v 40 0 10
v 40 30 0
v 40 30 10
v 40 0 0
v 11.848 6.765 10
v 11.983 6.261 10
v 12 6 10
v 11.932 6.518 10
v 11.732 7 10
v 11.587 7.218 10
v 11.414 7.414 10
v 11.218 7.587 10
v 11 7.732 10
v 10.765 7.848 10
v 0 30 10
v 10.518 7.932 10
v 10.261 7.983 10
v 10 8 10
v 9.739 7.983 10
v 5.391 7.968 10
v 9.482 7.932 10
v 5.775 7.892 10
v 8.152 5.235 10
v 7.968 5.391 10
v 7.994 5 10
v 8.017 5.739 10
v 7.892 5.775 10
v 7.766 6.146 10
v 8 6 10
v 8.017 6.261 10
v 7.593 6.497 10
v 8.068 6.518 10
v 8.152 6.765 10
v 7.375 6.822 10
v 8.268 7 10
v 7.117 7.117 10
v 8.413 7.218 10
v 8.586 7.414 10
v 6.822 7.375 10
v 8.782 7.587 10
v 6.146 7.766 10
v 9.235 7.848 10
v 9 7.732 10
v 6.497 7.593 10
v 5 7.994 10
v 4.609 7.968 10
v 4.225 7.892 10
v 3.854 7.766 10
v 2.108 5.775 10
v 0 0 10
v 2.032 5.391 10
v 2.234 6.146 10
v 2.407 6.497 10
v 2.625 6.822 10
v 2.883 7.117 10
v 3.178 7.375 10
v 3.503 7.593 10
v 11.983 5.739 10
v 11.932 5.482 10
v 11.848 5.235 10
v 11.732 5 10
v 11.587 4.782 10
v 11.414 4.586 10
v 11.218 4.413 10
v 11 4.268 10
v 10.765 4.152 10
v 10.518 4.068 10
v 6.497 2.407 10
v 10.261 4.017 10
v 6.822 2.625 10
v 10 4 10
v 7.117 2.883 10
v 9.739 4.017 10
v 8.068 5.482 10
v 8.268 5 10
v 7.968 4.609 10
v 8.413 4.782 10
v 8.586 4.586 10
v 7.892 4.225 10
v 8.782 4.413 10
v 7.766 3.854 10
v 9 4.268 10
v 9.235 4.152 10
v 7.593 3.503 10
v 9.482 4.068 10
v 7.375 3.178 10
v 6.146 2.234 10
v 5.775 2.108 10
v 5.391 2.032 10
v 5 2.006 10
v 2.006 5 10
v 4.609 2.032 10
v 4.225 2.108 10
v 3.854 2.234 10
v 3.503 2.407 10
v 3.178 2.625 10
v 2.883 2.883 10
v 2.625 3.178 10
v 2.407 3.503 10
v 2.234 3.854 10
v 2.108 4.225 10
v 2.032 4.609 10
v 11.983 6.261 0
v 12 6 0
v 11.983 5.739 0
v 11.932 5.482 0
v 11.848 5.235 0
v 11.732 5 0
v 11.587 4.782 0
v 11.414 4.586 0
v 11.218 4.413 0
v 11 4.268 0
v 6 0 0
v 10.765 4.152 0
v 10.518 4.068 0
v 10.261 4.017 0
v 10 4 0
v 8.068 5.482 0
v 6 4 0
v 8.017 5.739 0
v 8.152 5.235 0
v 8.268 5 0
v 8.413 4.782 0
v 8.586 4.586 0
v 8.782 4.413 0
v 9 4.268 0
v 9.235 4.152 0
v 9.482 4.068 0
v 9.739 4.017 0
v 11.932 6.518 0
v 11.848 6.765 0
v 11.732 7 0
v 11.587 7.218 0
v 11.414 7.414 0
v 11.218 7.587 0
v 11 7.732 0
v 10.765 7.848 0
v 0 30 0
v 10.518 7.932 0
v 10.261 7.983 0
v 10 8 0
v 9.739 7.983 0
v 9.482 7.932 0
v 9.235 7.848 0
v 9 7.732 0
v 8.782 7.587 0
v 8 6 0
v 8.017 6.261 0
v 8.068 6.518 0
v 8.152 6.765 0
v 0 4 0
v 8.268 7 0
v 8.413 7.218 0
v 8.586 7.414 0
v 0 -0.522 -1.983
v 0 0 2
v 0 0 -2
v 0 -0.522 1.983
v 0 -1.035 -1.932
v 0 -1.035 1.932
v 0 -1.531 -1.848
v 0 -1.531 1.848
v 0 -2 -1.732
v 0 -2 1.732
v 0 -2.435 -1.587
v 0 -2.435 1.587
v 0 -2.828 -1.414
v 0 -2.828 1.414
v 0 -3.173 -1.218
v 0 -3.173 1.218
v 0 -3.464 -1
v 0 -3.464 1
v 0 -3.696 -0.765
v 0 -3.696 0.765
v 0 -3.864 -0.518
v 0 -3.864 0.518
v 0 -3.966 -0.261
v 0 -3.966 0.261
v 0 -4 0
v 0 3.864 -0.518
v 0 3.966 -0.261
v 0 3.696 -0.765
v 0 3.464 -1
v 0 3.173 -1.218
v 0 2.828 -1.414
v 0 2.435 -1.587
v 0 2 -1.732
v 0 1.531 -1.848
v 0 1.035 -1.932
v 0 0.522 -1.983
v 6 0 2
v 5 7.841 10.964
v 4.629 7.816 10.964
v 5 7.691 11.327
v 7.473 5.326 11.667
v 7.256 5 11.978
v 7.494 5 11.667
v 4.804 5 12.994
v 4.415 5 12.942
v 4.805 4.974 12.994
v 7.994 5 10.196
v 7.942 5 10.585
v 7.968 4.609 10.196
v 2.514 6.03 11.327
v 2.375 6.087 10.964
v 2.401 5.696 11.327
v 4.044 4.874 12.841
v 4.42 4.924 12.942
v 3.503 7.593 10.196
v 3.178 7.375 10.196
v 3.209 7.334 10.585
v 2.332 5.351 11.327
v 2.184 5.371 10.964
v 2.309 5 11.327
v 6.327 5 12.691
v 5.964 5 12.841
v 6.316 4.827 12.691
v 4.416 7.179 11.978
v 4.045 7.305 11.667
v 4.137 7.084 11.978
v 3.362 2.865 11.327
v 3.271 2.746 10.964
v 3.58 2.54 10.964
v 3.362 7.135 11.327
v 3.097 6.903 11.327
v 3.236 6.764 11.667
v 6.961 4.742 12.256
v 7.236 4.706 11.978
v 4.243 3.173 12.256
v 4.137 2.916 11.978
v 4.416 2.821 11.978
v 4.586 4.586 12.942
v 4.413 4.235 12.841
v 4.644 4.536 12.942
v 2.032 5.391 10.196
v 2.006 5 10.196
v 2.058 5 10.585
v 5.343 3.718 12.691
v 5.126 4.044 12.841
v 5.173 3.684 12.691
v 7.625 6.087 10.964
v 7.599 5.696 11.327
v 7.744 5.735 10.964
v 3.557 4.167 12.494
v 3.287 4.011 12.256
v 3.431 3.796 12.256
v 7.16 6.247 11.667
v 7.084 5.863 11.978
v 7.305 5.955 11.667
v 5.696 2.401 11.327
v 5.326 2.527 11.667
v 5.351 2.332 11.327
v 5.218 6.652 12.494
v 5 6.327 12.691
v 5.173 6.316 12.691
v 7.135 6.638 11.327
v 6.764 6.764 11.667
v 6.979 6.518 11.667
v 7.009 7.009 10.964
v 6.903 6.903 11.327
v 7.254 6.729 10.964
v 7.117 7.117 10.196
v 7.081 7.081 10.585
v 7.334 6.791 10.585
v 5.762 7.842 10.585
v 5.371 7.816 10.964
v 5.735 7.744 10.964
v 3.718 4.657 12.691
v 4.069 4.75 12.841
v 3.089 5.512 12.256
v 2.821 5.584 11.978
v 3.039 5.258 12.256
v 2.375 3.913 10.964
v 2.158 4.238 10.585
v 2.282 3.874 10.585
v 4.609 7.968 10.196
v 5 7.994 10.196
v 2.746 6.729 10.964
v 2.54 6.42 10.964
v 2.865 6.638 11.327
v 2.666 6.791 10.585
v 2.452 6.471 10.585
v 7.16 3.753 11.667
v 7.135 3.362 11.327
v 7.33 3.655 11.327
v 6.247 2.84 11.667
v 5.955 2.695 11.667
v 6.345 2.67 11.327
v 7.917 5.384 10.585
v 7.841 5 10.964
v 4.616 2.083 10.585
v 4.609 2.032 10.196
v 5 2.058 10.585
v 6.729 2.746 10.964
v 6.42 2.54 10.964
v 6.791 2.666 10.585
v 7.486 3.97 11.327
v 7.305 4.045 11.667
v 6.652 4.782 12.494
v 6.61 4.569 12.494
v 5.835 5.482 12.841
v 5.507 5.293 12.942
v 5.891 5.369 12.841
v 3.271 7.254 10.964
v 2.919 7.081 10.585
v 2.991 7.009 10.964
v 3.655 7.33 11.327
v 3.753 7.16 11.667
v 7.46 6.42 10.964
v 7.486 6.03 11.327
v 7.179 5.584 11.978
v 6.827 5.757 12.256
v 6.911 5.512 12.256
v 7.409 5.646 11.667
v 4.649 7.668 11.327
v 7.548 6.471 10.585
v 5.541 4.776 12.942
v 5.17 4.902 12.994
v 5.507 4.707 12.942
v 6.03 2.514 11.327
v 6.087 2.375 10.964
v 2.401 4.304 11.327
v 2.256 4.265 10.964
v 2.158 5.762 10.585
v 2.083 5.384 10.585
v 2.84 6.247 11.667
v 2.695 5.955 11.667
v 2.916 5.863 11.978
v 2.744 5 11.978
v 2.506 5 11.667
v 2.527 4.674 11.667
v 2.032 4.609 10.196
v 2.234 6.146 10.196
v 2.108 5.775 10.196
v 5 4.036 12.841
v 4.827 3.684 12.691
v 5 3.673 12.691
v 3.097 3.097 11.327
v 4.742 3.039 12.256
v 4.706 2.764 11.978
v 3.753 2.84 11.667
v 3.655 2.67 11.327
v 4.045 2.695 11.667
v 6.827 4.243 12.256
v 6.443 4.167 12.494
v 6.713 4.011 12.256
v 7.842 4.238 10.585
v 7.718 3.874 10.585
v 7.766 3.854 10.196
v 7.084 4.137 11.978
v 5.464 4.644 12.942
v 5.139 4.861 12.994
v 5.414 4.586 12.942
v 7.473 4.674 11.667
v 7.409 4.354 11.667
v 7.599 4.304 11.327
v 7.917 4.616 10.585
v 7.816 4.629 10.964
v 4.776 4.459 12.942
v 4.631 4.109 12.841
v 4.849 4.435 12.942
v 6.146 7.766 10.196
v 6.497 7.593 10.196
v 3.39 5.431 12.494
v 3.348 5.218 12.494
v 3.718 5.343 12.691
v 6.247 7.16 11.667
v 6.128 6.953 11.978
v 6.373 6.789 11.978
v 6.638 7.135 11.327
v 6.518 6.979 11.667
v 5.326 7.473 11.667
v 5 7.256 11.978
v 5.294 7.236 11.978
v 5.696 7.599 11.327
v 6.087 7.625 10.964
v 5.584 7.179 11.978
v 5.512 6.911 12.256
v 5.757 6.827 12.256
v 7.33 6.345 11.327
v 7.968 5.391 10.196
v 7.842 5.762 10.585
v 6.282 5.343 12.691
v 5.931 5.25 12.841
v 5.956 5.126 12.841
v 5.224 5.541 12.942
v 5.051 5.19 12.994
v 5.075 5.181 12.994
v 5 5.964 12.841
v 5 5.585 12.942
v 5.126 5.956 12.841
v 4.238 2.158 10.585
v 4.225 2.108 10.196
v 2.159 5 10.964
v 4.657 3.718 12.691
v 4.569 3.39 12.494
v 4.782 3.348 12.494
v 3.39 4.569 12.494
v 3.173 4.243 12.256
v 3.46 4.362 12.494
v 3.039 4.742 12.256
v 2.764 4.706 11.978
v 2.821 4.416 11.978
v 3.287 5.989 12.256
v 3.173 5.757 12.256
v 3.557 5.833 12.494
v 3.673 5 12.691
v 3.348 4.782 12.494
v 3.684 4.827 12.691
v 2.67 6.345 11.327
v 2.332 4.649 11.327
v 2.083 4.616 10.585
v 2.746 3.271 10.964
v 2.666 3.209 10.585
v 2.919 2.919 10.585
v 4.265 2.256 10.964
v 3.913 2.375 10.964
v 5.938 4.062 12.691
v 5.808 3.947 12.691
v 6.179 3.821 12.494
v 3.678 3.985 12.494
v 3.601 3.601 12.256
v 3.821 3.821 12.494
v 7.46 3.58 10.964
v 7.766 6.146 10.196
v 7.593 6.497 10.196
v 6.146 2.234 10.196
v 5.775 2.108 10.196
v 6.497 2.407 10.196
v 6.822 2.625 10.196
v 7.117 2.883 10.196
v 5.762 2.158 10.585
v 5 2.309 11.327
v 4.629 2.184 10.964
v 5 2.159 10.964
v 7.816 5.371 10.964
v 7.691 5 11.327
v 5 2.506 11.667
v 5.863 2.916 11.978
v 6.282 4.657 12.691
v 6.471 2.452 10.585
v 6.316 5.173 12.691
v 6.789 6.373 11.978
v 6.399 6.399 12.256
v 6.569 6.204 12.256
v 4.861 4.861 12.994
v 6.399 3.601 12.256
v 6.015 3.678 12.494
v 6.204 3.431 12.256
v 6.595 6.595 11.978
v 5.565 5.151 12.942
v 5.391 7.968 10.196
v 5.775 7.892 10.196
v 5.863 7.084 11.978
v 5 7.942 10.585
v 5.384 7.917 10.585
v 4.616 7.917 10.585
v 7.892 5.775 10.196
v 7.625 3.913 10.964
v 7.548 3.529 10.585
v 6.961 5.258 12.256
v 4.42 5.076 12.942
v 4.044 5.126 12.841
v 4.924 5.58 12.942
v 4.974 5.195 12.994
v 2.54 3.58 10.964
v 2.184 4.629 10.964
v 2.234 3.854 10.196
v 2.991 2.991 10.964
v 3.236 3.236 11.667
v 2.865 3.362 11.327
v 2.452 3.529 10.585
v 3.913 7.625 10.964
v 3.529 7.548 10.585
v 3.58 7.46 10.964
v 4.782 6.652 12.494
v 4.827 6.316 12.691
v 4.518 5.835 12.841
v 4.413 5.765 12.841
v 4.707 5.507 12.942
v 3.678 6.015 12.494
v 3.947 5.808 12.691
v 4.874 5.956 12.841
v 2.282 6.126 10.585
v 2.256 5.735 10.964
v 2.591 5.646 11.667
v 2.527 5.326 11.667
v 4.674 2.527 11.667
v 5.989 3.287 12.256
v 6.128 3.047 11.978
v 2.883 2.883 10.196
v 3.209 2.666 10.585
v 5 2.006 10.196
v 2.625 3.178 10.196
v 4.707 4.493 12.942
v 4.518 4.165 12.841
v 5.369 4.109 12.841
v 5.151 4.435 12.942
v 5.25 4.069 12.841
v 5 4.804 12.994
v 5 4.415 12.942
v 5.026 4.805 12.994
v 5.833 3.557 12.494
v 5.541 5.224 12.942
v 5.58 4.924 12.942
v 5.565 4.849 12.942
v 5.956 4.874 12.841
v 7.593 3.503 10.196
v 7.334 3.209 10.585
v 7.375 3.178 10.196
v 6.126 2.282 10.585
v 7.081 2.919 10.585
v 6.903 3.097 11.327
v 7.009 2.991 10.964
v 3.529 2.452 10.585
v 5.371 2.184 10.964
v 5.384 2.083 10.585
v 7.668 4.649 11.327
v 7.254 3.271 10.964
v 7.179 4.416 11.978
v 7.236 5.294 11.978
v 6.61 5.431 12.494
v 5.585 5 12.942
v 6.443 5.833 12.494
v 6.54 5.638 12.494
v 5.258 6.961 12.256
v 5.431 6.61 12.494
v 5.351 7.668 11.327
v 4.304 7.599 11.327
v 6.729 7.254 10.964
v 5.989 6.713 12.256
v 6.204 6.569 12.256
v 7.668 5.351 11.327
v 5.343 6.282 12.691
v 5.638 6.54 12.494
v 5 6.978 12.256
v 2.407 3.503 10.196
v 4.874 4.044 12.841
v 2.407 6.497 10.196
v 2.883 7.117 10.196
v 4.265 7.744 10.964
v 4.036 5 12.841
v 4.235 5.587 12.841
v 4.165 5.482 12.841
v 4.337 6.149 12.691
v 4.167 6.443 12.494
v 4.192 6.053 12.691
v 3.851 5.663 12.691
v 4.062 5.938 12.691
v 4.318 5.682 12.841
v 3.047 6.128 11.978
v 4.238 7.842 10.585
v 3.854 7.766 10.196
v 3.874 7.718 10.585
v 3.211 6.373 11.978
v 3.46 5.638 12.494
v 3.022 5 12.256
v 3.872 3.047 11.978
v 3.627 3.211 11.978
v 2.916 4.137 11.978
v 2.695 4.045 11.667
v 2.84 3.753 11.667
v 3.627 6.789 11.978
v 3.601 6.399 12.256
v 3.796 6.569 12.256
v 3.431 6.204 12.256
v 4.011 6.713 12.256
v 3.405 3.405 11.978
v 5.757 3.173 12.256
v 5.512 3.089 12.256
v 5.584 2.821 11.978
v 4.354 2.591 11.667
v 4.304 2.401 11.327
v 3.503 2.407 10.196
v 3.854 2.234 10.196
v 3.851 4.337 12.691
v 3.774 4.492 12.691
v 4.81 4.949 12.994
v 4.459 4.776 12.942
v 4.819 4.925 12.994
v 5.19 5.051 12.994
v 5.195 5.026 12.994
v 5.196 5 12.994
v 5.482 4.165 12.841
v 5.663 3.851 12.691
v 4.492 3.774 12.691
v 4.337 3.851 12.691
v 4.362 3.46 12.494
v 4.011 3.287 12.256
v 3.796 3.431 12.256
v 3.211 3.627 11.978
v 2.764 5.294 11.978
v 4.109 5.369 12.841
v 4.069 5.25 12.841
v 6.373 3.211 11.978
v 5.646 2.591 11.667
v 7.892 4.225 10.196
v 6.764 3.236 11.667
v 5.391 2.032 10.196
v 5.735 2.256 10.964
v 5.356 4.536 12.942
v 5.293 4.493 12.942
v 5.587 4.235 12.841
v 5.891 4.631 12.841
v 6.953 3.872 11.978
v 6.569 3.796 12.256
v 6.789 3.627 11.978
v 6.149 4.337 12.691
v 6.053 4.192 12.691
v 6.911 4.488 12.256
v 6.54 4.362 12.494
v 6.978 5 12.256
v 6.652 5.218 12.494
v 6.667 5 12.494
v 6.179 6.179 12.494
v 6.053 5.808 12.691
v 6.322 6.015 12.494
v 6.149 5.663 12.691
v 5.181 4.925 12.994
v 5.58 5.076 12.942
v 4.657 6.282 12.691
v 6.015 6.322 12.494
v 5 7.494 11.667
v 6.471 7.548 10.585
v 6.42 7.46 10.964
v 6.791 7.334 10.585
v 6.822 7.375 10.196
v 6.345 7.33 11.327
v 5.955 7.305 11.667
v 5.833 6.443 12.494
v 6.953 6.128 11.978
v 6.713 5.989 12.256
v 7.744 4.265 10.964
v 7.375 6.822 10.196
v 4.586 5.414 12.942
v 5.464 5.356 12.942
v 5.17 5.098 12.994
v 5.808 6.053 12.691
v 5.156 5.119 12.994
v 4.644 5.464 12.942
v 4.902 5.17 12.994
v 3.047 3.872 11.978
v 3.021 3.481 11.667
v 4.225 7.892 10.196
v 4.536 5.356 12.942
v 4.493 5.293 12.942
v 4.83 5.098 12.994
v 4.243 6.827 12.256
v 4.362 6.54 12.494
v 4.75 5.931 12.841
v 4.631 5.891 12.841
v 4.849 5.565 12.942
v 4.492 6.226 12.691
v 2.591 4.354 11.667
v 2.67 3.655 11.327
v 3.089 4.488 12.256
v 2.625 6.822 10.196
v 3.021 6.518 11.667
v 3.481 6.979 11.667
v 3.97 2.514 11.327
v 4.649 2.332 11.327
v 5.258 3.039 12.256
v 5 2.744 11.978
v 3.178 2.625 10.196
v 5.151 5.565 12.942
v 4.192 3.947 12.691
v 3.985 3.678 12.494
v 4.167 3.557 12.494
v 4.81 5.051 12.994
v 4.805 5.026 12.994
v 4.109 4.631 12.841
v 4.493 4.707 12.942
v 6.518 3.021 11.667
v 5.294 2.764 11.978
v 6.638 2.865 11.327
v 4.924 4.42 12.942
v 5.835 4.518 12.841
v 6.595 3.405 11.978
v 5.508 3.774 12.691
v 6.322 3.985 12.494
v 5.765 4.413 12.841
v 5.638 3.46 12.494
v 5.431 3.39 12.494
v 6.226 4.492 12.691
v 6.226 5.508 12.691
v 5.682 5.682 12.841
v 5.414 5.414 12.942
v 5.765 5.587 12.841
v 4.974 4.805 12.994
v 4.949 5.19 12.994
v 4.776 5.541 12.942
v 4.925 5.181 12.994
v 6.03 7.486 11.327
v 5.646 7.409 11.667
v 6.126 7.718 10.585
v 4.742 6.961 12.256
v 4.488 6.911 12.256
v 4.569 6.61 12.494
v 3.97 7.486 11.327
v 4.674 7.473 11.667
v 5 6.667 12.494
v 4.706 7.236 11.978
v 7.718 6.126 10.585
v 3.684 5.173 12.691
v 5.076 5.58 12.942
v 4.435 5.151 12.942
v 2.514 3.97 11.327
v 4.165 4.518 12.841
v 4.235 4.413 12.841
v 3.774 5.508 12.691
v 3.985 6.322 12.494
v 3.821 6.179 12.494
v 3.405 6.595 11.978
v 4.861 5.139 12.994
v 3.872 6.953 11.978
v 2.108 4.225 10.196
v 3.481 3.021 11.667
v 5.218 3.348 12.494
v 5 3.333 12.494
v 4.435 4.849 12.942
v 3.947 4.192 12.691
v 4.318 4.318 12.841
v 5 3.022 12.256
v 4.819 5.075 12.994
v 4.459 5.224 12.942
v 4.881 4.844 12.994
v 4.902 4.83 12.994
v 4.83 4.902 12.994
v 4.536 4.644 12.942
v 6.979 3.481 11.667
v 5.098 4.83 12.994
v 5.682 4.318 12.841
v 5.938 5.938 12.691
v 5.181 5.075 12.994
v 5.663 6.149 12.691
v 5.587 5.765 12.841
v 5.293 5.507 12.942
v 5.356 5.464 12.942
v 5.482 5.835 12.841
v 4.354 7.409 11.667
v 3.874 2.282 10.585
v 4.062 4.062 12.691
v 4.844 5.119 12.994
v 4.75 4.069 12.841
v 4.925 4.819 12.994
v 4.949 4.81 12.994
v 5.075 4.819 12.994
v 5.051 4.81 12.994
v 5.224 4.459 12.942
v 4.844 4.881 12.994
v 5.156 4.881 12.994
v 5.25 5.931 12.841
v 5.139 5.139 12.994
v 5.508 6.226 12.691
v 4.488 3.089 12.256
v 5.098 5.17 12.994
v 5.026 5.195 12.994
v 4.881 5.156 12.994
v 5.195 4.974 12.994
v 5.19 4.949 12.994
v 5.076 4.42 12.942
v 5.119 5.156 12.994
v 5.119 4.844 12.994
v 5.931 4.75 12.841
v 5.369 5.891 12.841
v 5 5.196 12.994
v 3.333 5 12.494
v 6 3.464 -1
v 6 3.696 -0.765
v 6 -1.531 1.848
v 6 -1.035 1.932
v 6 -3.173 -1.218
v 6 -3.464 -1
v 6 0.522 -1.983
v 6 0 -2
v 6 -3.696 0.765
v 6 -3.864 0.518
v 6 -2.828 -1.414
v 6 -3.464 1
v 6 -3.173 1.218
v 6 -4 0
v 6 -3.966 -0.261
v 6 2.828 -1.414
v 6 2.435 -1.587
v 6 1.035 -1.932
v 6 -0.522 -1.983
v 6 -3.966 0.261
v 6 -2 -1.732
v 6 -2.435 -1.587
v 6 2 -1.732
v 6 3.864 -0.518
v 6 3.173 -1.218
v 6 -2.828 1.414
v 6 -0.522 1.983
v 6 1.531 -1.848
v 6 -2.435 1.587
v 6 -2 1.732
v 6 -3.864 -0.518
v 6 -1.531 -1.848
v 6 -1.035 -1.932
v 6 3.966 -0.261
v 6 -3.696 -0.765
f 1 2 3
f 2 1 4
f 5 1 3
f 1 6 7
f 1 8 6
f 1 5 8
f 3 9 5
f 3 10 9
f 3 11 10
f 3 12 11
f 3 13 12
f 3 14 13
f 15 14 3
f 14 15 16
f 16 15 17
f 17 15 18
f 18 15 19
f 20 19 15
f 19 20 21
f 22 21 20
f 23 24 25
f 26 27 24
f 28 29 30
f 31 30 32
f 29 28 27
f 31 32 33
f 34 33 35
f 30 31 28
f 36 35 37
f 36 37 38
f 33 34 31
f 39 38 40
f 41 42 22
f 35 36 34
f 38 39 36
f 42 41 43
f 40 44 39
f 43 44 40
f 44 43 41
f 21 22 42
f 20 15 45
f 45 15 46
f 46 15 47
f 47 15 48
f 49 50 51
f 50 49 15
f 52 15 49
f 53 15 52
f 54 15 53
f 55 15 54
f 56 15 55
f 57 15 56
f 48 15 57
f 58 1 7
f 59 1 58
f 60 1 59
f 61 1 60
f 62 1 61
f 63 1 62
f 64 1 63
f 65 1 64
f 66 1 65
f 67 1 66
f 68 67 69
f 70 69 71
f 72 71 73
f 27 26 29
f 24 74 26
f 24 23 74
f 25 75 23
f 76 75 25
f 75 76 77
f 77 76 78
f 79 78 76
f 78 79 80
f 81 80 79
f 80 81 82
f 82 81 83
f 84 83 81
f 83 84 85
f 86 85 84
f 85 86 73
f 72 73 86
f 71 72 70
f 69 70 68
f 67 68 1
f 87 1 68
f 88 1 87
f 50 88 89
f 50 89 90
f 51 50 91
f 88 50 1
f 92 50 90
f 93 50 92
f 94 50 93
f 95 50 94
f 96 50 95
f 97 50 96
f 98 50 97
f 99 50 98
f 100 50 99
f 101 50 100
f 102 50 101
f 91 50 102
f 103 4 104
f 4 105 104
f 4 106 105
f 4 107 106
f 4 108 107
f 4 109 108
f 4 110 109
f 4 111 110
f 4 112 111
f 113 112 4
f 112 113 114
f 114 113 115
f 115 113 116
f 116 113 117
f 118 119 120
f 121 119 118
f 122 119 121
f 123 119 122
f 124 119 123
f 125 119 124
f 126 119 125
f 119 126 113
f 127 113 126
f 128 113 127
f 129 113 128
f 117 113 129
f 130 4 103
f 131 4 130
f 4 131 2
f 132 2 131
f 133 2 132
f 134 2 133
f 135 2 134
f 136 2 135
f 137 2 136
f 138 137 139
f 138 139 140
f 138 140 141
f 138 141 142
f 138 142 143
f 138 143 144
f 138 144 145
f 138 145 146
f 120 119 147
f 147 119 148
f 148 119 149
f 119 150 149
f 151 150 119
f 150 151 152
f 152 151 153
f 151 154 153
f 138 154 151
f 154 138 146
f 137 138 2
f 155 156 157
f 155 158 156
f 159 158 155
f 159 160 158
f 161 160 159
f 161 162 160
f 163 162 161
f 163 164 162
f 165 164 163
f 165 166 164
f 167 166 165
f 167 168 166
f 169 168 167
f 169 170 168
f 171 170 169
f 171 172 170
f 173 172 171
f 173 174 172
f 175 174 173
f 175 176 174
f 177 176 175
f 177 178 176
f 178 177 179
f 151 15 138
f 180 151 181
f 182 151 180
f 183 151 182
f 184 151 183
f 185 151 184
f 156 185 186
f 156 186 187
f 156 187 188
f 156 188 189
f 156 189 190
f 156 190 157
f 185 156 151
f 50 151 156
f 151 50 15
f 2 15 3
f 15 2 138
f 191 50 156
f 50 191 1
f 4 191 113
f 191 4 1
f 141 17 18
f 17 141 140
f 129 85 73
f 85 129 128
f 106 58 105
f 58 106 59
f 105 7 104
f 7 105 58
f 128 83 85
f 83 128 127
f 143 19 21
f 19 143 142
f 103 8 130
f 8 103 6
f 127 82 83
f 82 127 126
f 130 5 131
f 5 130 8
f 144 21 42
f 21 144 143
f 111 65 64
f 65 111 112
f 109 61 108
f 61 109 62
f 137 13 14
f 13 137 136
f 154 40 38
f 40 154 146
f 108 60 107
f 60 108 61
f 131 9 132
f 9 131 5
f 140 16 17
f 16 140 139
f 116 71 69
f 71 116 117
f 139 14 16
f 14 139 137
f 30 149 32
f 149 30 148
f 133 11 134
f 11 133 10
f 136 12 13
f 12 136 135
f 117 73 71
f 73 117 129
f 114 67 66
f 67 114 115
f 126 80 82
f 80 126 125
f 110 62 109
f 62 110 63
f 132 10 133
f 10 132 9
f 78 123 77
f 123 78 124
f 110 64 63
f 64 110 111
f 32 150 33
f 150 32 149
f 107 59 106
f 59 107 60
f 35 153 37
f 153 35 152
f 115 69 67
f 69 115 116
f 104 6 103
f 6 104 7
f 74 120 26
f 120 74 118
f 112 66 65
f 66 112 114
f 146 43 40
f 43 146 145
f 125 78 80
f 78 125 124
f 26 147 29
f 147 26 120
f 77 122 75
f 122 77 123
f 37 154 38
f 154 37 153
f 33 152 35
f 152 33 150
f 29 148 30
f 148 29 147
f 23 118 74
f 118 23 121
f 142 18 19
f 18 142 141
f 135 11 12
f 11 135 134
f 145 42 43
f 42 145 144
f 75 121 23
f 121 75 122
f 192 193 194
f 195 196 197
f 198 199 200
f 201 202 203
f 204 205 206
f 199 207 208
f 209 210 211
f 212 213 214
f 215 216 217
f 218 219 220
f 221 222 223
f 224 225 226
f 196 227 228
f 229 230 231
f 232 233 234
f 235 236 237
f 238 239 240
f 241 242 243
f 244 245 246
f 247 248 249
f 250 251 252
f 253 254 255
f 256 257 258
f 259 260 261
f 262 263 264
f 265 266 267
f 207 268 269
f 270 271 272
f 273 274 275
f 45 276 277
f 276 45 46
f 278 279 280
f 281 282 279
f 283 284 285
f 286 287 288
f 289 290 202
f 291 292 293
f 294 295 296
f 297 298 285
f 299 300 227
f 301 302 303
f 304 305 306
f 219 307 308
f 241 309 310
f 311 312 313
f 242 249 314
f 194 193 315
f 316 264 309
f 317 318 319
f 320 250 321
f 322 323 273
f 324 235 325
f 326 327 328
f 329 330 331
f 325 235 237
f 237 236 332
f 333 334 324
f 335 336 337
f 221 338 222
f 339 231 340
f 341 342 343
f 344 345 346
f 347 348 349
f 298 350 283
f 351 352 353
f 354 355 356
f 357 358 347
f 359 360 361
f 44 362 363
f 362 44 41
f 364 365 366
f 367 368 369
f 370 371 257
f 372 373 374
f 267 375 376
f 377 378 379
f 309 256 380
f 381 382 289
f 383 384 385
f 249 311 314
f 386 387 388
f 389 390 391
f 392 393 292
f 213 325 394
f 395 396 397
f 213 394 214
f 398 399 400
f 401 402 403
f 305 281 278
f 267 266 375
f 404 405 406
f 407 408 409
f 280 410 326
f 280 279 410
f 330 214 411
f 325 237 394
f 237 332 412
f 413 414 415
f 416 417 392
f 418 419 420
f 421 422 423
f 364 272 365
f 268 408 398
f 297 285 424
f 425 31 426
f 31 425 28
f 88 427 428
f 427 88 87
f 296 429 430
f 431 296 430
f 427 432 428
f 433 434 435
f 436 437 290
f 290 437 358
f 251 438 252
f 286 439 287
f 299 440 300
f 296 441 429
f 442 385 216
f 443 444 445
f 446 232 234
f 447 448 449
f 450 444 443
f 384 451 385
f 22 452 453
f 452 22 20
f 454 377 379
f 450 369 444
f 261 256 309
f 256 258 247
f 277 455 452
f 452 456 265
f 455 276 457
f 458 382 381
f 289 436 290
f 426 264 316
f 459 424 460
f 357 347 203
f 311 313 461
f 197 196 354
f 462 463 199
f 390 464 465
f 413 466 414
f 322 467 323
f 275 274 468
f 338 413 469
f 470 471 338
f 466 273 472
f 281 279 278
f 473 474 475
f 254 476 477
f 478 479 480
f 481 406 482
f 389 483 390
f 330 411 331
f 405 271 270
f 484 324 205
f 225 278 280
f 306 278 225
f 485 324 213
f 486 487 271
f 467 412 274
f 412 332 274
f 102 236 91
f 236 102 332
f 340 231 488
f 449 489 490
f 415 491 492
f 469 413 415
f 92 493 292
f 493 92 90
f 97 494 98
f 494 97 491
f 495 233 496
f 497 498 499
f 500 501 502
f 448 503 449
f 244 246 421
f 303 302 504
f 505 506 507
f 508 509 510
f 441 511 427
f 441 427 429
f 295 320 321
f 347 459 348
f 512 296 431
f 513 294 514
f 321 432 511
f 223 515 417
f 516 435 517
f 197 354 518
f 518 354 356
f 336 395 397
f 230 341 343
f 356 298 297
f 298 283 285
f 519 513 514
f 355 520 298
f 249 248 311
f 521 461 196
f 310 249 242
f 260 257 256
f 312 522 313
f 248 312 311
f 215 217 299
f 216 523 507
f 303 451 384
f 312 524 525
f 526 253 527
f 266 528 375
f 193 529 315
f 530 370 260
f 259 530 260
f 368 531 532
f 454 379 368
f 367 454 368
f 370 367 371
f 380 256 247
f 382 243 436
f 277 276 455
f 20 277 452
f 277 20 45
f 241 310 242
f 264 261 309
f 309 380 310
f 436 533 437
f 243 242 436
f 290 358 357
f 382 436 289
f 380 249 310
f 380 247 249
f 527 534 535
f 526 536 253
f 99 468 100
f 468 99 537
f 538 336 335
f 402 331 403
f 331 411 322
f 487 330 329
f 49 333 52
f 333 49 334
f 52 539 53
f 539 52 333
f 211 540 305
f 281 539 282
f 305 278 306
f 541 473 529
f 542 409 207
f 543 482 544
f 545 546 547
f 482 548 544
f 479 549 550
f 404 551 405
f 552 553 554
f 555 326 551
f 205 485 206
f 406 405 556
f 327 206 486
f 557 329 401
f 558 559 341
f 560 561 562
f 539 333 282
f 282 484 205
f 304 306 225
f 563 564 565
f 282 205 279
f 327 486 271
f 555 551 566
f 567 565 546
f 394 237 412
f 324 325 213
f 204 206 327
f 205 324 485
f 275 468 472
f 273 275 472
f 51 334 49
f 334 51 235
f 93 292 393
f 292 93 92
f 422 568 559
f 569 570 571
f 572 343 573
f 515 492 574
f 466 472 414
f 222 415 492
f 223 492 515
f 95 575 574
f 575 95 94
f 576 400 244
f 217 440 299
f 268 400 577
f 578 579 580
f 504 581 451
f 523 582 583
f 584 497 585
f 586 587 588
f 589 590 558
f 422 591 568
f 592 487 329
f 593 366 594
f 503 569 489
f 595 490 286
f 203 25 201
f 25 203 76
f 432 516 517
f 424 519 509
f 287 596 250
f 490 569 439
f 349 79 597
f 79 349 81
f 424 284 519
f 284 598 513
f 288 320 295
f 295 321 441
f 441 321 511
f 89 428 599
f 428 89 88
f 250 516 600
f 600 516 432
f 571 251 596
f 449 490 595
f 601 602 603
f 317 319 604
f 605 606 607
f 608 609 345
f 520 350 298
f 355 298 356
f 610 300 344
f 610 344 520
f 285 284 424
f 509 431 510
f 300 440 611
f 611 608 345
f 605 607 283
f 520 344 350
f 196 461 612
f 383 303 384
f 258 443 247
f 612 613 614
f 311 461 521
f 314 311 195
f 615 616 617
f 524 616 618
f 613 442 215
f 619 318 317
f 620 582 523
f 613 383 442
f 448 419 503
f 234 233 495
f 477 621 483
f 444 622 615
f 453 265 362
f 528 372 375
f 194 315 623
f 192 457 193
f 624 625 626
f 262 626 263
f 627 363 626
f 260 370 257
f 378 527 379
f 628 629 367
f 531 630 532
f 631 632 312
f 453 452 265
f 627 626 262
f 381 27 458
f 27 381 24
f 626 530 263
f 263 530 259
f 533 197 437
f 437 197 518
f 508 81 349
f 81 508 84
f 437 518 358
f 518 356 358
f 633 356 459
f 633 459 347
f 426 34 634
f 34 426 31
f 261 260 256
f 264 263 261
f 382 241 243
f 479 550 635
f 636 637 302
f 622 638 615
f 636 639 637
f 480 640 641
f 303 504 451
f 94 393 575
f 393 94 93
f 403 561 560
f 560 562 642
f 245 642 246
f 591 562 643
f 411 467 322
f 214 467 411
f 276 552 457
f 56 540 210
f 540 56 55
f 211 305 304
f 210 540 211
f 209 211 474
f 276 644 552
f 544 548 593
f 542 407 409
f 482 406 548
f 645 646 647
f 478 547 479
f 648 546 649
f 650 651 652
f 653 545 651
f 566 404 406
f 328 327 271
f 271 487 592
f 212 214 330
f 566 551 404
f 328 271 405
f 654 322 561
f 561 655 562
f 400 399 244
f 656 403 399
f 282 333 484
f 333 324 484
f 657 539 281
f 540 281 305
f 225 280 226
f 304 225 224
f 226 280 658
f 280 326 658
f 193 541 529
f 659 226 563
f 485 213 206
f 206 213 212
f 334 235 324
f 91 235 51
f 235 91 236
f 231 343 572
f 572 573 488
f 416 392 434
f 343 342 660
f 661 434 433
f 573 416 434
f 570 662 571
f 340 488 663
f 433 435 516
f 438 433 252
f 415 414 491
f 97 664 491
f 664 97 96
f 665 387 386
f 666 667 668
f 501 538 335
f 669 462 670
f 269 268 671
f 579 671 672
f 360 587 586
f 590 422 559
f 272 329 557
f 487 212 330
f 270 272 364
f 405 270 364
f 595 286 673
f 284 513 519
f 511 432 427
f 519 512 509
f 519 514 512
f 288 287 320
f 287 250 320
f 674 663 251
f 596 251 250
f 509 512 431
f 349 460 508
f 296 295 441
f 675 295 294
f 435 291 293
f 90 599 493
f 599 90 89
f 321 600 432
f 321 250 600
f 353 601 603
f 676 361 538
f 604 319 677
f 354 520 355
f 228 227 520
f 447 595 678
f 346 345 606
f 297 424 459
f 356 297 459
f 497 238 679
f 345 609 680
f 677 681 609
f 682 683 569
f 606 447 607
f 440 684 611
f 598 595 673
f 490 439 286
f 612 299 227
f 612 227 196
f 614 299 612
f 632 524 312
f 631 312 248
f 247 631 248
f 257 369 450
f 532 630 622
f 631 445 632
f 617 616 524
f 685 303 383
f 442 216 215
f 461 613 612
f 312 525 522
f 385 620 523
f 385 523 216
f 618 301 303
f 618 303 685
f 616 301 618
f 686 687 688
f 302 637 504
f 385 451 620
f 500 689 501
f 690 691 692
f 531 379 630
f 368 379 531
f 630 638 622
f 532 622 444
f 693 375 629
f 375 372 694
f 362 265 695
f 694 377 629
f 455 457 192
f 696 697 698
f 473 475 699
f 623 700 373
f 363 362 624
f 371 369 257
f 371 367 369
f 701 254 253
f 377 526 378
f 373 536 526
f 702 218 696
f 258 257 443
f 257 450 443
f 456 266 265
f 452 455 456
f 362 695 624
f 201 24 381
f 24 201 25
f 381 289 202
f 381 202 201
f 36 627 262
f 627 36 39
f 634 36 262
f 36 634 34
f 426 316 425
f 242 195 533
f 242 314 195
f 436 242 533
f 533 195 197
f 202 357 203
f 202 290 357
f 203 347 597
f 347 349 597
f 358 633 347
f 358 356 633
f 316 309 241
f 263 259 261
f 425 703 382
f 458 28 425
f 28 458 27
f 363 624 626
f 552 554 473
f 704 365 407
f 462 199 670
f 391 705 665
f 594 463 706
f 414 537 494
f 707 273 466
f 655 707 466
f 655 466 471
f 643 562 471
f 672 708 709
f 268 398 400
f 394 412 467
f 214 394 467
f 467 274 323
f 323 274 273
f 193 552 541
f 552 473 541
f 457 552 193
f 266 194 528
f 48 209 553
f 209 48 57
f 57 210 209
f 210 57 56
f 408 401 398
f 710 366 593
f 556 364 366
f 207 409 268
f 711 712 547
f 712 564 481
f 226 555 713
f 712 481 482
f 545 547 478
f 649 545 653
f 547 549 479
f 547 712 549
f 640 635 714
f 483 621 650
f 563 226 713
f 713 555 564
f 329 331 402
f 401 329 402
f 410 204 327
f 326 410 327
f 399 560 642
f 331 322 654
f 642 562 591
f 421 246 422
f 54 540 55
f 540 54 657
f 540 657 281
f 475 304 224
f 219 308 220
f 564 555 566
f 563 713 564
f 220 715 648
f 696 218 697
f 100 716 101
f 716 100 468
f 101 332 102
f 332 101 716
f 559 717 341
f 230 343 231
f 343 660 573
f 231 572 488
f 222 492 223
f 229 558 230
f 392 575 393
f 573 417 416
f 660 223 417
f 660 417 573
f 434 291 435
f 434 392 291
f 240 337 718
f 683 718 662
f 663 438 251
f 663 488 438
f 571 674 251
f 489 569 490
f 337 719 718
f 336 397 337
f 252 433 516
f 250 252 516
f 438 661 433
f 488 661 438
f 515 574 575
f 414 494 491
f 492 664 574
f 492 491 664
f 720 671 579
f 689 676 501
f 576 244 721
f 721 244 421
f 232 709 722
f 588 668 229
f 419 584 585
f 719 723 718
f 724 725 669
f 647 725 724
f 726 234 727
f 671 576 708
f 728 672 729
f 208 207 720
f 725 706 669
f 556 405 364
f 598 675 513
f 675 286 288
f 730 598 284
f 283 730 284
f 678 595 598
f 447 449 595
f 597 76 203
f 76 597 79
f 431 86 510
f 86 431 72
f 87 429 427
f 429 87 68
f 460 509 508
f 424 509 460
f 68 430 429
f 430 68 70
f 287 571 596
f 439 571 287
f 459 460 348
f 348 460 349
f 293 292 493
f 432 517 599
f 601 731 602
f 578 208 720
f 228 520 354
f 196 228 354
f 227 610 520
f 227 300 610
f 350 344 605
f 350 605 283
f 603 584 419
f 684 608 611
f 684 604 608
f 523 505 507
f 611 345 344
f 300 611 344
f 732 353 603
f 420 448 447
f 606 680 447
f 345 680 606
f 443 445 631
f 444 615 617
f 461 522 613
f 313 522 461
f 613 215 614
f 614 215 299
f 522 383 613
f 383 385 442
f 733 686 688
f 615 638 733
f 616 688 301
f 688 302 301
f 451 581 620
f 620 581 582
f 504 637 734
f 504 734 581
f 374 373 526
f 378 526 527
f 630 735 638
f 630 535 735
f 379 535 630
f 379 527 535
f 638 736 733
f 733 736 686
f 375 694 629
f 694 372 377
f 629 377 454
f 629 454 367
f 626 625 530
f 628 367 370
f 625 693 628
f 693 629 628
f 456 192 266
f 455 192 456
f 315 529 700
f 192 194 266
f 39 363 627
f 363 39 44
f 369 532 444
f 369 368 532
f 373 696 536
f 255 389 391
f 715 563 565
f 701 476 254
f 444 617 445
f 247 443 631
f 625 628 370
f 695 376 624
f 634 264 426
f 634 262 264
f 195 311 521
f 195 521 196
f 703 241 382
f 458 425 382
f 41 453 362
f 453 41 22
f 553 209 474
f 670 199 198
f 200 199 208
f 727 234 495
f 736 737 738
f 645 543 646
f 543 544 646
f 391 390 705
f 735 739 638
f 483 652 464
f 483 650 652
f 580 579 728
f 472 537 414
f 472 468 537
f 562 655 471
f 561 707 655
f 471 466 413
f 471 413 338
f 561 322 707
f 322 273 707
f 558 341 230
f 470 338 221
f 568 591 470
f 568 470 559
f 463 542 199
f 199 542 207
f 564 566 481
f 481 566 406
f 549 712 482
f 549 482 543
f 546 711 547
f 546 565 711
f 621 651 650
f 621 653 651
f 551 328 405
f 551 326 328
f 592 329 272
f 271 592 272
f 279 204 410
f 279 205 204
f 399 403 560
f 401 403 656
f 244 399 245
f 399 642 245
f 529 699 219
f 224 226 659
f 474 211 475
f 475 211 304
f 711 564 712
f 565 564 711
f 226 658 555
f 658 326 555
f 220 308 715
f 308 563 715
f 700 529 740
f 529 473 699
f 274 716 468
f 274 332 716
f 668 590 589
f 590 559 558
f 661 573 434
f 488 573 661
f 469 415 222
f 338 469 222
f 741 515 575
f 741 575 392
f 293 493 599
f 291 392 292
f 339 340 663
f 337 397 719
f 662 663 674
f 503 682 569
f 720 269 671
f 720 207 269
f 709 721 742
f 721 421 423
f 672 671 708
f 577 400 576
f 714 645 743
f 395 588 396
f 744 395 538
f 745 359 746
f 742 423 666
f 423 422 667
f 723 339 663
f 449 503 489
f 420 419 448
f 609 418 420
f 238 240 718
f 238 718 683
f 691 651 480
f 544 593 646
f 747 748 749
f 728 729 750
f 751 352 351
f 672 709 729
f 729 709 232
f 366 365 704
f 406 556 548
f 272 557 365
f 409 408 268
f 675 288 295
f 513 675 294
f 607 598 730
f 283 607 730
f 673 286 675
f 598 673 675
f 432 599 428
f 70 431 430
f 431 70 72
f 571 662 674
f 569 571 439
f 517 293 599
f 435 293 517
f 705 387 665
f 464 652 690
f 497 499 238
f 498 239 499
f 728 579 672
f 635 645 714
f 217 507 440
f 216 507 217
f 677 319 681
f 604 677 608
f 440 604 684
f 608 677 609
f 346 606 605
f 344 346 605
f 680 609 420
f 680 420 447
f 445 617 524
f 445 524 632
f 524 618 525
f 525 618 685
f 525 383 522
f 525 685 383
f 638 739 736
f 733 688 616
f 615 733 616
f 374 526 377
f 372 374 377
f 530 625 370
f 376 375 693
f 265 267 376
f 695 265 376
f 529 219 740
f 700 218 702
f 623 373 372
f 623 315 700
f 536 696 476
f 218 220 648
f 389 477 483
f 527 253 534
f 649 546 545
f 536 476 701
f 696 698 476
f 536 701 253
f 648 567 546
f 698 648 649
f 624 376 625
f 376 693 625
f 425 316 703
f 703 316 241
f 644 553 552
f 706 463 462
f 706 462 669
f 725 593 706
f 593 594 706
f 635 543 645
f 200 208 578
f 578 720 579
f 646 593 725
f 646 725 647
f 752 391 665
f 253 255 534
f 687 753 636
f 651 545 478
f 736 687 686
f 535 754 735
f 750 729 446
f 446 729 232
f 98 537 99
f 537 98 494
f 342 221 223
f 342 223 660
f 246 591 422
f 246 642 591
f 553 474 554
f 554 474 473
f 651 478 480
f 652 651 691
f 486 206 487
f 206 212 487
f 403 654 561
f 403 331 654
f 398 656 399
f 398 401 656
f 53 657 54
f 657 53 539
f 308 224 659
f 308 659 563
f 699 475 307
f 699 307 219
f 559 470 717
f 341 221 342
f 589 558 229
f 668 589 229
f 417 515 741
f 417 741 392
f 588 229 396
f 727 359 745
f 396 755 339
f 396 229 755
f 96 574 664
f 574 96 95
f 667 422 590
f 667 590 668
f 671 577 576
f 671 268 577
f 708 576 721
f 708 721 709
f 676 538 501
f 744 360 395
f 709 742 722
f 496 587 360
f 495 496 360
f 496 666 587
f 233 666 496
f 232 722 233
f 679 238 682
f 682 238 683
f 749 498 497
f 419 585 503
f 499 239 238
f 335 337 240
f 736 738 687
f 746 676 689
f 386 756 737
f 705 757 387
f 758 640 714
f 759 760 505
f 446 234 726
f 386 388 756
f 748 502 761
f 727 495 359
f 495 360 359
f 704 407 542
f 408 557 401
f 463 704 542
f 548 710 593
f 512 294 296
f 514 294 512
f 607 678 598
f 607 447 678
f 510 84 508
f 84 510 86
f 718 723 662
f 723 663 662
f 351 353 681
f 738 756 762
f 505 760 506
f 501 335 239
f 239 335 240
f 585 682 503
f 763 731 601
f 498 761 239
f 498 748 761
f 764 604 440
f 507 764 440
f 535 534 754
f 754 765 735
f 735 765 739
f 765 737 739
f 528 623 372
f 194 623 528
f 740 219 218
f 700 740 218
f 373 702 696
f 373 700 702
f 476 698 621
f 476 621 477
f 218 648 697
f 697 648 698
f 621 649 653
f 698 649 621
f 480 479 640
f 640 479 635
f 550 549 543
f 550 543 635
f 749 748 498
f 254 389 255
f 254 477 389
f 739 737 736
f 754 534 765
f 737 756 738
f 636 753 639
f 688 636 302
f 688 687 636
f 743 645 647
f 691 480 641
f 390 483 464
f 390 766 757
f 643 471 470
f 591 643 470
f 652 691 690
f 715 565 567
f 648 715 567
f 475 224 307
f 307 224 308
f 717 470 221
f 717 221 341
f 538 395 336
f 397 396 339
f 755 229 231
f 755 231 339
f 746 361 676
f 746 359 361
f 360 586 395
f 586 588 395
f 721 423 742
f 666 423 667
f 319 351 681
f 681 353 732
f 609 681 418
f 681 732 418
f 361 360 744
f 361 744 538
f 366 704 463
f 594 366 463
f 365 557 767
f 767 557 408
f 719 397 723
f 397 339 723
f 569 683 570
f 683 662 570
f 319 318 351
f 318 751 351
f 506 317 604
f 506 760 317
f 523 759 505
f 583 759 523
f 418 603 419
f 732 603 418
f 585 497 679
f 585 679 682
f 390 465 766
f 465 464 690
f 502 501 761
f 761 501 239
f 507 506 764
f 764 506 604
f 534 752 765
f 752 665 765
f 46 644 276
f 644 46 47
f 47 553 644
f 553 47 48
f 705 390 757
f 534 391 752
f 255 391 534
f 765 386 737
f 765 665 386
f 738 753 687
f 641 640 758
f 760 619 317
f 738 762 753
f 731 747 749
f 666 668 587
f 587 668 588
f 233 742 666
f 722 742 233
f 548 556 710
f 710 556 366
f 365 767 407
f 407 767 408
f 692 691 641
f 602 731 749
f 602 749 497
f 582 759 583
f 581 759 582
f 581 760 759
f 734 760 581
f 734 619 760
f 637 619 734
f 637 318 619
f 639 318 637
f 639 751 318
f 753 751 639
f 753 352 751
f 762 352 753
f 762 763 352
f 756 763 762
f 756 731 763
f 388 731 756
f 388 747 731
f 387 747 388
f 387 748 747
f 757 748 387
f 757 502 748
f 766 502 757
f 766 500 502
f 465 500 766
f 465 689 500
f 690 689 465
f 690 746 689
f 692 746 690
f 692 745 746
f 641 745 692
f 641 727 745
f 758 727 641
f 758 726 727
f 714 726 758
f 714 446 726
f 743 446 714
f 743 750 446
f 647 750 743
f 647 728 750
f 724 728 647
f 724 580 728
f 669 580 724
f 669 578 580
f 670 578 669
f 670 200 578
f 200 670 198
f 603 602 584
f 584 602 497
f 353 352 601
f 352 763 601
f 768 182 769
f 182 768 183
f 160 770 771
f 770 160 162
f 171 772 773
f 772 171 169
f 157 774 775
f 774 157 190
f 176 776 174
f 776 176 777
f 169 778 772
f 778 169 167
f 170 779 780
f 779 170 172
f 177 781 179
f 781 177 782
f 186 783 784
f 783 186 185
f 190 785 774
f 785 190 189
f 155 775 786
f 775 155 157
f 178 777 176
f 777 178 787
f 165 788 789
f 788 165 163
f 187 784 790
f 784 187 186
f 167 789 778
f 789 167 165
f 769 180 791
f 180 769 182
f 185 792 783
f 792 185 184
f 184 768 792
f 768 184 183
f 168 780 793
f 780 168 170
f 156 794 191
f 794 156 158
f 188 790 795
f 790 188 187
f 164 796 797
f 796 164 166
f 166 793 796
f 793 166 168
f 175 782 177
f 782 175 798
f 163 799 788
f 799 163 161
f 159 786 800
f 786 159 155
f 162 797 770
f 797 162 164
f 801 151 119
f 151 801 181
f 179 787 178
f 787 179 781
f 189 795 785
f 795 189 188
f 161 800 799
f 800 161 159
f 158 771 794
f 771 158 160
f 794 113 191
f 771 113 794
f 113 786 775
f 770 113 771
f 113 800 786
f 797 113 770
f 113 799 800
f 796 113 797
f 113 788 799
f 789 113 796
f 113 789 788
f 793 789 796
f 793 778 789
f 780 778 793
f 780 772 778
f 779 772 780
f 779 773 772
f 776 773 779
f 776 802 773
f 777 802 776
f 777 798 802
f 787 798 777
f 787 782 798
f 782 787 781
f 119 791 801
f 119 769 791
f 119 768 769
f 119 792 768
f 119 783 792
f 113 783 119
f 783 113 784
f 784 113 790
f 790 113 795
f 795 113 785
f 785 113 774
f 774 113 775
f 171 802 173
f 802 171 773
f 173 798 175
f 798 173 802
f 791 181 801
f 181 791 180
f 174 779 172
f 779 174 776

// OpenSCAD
// units=mm — generated by scad_emitter.py
// part=unnamed
$fn = 48;

difference() { cube([40, 30, 10]); translate([10, 6, 10.5]) rotate([180, 0, 0]) cylinder(h=11, r=2, $fn=$fn); }
union() { translate([5, 5, 10]) sphere(r=3, $fn=$fn); rotate([0, 90, 0]) scale([1, 2, 1]) cylinder(h=6, r=2, $fn=$fn); };
